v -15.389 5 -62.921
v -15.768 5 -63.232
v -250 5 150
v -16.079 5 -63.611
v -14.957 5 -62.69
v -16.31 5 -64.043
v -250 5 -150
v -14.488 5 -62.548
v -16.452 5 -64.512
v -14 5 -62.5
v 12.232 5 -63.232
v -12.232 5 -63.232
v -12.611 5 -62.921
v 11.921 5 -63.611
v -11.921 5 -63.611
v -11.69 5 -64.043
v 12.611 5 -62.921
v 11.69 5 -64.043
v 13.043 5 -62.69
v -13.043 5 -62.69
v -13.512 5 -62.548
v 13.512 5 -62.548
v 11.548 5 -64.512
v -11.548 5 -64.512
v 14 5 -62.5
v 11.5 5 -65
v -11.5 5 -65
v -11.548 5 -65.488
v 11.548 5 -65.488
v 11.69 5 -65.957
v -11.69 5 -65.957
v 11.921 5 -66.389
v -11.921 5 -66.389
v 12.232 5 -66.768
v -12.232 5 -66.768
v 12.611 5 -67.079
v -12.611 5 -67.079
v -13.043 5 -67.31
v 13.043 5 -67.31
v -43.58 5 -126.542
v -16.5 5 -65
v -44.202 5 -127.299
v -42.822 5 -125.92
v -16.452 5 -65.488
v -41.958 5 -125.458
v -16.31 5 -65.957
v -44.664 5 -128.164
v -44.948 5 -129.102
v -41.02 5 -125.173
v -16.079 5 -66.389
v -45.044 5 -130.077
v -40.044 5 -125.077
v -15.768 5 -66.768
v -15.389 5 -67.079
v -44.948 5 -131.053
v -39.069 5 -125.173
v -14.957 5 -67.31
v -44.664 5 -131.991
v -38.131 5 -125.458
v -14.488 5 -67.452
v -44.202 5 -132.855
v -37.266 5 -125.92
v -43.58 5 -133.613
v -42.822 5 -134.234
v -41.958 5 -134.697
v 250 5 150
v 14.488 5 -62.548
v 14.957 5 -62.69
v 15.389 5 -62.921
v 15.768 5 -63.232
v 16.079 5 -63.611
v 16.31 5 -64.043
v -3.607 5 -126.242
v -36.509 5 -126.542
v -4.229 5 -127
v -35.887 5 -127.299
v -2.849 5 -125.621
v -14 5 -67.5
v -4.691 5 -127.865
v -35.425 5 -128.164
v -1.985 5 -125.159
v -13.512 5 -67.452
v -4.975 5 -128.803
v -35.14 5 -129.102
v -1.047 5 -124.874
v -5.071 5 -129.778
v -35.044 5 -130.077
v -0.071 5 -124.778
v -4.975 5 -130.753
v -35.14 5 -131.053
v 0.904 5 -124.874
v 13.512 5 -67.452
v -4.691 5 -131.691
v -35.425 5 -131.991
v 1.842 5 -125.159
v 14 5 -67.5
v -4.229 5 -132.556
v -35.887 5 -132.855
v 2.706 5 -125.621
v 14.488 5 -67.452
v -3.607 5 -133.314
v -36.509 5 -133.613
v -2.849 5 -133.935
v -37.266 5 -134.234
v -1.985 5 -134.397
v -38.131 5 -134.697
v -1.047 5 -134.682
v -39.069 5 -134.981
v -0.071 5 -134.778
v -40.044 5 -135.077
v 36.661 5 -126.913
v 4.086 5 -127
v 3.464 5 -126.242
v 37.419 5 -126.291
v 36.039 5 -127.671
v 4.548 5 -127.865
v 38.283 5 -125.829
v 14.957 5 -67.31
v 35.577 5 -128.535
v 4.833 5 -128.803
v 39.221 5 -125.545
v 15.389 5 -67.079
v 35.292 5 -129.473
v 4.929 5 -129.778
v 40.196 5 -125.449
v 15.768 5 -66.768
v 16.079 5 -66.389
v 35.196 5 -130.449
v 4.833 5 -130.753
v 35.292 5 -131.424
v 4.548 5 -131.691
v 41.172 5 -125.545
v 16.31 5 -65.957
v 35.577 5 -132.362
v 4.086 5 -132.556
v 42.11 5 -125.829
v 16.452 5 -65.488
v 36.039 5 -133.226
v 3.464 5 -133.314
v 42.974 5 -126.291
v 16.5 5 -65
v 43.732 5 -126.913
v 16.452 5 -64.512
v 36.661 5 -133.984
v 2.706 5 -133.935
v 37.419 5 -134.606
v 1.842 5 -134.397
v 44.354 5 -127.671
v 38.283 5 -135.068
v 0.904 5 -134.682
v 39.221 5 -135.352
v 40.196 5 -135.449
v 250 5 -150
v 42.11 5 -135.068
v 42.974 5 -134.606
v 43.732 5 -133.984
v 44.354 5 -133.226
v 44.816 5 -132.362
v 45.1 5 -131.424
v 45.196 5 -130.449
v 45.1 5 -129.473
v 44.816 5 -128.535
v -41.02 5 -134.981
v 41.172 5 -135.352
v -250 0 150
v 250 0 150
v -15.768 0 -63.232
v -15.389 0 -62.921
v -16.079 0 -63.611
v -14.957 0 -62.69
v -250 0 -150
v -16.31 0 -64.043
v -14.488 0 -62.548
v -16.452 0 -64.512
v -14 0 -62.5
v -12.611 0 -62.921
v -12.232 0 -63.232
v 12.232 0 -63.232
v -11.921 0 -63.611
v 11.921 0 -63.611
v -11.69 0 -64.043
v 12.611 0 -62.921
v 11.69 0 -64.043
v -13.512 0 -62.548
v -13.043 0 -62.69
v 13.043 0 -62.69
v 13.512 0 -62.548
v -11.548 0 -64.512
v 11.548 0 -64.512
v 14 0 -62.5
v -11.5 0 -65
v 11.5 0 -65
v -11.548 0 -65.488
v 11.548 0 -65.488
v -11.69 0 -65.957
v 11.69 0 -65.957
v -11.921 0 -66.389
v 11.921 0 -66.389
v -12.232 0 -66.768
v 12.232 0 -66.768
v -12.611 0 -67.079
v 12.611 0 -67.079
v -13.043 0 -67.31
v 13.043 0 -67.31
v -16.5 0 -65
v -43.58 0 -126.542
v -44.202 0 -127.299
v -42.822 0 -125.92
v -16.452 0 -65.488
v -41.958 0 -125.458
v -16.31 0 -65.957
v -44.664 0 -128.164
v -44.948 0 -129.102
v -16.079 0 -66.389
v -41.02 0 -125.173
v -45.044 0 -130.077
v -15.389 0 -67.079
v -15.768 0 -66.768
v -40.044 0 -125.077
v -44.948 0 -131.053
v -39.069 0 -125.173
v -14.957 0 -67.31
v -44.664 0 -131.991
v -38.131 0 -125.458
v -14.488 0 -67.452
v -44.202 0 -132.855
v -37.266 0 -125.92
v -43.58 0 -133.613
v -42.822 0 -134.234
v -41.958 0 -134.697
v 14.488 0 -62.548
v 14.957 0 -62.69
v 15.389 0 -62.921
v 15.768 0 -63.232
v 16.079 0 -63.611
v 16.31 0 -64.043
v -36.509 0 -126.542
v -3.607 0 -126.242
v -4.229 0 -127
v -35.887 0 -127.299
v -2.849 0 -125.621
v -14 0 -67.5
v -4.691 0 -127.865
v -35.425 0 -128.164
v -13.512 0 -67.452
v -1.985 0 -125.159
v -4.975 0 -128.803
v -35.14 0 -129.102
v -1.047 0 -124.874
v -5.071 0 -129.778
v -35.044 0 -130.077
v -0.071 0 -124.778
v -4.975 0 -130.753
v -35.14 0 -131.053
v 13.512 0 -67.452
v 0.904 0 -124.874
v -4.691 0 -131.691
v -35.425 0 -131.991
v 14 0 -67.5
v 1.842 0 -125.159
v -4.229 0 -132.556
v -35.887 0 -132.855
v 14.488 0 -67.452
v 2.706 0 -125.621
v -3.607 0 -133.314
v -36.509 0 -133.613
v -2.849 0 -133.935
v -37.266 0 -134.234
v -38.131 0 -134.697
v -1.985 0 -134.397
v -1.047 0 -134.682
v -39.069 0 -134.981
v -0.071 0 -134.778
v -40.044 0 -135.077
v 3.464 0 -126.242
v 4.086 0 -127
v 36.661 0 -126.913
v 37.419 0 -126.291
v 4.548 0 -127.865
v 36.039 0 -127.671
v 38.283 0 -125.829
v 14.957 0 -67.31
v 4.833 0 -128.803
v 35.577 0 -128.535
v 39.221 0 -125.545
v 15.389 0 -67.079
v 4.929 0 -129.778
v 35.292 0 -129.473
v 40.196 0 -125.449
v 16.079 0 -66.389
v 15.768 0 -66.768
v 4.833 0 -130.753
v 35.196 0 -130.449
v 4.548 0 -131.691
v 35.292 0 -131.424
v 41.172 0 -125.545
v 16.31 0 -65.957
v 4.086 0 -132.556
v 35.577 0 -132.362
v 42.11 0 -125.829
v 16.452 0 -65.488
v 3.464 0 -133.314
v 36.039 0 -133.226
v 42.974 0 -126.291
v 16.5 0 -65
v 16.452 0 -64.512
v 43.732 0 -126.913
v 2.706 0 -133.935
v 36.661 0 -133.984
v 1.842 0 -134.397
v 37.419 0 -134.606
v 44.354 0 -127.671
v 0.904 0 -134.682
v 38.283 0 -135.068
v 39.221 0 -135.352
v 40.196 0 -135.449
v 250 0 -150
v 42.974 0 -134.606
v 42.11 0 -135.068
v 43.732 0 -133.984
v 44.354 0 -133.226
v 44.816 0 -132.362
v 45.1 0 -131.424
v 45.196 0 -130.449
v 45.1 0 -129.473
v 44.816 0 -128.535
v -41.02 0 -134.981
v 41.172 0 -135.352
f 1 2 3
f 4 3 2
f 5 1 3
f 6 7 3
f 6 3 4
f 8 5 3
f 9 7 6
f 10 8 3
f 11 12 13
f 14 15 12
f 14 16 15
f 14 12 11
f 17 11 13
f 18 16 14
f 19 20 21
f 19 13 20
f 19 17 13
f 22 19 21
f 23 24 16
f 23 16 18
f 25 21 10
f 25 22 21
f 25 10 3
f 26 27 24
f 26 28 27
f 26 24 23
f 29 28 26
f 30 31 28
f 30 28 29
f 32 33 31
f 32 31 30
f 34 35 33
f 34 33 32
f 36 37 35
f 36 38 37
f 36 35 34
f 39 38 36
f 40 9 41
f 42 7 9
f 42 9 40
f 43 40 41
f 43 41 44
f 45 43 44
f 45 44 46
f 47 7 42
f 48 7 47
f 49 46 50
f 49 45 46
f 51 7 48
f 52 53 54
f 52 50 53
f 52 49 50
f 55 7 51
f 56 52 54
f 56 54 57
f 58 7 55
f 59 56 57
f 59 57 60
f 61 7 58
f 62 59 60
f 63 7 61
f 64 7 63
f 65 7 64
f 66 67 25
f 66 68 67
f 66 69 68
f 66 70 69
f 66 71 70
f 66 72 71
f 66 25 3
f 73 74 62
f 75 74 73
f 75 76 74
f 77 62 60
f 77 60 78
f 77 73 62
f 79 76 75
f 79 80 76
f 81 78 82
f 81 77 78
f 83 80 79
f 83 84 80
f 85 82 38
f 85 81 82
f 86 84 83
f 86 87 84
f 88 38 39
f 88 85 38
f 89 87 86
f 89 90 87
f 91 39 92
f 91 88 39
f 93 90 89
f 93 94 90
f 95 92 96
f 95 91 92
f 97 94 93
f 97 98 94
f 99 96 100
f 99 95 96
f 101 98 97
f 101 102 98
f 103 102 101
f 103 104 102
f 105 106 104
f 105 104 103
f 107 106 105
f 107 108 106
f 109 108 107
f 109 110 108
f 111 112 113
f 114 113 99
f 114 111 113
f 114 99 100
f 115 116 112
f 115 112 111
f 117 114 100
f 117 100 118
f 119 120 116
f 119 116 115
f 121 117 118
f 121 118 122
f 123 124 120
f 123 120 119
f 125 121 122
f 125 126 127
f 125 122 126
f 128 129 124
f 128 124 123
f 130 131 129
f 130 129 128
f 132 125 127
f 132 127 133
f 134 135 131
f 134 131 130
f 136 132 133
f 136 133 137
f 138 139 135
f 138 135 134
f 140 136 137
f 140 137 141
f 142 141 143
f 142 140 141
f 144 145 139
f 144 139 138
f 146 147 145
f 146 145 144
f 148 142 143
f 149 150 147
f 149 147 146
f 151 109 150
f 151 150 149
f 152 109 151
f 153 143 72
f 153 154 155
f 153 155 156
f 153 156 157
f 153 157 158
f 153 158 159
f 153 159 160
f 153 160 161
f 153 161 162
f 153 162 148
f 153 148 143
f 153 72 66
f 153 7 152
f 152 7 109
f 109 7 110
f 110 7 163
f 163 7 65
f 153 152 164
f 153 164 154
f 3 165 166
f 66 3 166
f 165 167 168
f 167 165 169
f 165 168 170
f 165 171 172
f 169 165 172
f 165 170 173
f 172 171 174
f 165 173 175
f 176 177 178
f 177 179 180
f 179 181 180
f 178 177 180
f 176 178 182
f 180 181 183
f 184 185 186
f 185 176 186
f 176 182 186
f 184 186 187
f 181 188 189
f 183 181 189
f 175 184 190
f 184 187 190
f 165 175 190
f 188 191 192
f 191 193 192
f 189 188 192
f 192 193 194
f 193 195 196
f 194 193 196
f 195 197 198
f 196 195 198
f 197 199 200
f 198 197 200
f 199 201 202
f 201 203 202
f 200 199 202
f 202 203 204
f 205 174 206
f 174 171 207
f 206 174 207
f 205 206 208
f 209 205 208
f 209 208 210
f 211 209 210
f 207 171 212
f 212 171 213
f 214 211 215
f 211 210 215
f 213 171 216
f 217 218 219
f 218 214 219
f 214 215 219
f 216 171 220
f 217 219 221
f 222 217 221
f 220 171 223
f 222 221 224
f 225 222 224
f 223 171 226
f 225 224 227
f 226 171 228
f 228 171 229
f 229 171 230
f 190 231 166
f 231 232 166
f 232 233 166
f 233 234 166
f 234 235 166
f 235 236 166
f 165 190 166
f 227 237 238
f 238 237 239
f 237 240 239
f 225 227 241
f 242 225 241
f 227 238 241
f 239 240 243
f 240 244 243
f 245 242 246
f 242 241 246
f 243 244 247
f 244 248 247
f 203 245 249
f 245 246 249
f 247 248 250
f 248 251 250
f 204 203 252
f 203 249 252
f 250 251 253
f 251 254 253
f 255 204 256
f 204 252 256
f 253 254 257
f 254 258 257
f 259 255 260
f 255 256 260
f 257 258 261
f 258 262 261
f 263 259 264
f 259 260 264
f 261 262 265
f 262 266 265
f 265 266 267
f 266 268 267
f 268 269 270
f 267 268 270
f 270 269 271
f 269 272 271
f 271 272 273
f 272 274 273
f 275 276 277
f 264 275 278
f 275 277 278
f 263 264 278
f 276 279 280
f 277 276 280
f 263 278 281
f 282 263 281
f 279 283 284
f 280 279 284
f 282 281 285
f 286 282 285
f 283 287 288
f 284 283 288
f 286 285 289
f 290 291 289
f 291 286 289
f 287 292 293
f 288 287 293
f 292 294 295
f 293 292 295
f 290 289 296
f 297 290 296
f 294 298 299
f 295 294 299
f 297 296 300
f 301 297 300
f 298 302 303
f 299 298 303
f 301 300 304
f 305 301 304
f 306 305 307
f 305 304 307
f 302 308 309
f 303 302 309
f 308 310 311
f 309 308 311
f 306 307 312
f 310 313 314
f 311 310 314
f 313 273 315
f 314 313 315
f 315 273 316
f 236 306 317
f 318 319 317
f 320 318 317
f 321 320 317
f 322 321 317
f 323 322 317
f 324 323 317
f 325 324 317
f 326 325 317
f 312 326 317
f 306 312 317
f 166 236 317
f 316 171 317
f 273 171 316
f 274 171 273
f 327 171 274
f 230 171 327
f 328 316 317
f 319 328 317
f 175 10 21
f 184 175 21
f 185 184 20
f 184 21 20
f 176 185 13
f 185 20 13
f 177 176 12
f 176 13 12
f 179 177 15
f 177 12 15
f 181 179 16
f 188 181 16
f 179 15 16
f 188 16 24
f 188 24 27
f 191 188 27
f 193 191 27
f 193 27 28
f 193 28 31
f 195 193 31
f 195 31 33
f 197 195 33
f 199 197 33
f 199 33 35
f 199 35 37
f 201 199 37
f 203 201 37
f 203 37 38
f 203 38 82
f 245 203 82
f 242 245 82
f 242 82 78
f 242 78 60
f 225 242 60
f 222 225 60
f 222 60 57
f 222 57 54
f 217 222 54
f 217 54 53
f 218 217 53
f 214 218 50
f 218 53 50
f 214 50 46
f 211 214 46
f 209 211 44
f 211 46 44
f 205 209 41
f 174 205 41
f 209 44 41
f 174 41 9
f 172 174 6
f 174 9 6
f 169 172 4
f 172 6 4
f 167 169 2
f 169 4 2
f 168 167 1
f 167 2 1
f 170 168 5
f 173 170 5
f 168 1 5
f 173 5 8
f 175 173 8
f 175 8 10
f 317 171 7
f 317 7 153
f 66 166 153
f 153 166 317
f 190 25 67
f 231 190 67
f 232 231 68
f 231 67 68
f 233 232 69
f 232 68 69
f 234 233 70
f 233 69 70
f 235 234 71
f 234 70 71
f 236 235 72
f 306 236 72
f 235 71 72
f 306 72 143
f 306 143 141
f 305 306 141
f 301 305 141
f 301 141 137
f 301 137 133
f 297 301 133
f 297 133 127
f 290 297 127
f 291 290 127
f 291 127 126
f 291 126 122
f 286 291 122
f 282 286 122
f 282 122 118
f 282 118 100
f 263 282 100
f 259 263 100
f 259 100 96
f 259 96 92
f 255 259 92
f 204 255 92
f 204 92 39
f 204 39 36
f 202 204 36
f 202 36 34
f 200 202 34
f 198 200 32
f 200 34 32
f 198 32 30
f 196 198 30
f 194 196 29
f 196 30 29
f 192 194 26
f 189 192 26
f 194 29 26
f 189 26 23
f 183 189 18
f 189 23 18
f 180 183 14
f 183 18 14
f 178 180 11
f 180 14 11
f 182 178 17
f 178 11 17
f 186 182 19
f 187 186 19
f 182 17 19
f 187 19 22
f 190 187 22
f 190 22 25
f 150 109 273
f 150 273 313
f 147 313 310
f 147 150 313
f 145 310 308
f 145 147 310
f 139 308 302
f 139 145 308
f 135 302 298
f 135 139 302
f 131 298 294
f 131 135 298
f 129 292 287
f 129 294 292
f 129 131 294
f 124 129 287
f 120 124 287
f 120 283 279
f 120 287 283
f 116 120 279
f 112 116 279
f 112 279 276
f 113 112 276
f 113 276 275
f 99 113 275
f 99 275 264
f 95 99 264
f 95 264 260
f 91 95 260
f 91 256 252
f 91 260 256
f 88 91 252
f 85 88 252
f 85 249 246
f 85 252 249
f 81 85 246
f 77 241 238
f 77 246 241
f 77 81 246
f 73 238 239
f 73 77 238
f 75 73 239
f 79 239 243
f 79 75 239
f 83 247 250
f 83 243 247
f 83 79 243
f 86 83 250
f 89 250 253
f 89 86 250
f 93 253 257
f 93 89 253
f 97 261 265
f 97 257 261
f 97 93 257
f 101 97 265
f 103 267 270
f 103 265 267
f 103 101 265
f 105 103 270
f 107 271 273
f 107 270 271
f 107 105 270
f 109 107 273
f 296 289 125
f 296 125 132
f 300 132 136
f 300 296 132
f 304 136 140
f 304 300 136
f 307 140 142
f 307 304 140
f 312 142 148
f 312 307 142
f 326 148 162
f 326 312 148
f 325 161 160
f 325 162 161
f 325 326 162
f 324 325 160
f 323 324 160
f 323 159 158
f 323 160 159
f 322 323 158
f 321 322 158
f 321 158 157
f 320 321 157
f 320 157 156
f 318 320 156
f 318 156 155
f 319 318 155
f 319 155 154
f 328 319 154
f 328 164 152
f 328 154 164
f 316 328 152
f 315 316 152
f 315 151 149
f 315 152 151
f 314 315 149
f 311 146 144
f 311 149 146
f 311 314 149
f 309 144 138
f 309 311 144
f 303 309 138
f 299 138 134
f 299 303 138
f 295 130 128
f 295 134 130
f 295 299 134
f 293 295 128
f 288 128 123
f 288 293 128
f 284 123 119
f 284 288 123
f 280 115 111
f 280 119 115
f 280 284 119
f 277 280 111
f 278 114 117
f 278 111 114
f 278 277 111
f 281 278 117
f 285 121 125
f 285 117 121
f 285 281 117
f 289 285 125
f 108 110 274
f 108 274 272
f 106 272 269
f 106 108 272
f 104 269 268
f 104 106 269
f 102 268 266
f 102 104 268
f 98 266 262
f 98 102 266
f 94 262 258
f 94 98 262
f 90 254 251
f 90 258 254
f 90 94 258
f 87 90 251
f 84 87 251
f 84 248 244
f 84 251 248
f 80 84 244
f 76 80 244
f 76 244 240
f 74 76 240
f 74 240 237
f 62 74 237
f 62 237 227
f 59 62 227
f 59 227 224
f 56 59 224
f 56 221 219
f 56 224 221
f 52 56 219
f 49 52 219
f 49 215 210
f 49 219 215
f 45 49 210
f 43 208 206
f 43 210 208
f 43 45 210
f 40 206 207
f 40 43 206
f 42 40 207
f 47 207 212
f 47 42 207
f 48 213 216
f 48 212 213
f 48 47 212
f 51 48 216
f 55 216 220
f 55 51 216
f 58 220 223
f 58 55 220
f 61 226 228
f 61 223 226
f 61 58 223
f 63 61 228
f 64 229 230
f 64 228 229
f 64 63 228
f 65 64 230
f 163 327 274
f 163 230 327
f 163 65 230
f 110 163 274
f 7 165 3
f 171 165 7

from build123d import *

# Parameters (mm, degrees)
SKETCH2_W               = 500
SKETCH2_H               = 300
BOSS_EXTRUDE1_DEPTH     = 5
CUT_EXTRUDE1_DEPTH      = 292.590466236
CUT_EXTRUDE1_DEPTH_BACK = 292.590466236
SKETCH3_R               = 5
CUT_EXTRUDE2_DEPTH      = 292.590466236
CUT_EXTRUDE2_DEPTH_BACK = 292.590466236
SKETCH4_R               = 5
SKETCH5_R               = 2.5
CUT_EXTRUDE3_DEPTH      = 292.590466236


with BuildPart() as part:
    # Sketch2 → Boss-Extrude1 (new body)
    with BuildSketch(Plane(origin=(0, 0, 0), x_dir=(1, 0, 0), z_dir=(0, 1, 0))):
        Rectangle(SKETCH2_W, SKETCH2_H)
    extrude(amount=BOSS_EXTRUDE1_DEPTH)

    # Sketch3 → Cut-Extrude1 (cut, two sides: drawn at the far end of the back side and taken through both)
    with BuildSketch(Plane.XZ.offset(-CUT_EXTRUDE1_DEPTH_BACK)):
        with Locations(Location((-40.044249933, -130.077128907, 0), (0, 0, 270))):
            Circle(SKETCH3_R)
        with Locations(Location((-0.071386653, -129.777985414, 0), (0, 0, 270))):
            Circle(SKETCH3_R)
    extrude(amount=CUT_EXTRUDE1_DEPTH + CUT_EXTRUDE1_DEPTH_BACK, mode=Mode.SUBTRACT)

    # Sketch4 → Cut-Extrude2 (cut, two sides: drawn at the far end of the back side and taken through both)
    with BuildSketch(Plane(origin=(0, 5, 0), x_dir=(1, 0, 0), z_dir=(0, 1, 0)).offset(-CUT_EXTRUDE2_DEPTH_BACK)):
        with Locations(Location((40.196351758, 130.448547008, 0), (0, 0, 270))):
            Circle(SKETCH4_R)
    extrude(amount=CUT_EXTRUDE2_DEPTH + CUT_EXTRUDE2_DEPTH_BACK, mode=Mode.SUBTRACT)

    # Sketch5 → Cut-Extrude3 (cut, through all)
    with BuildSketch(Plane(origin=(0, 5, 0), x_dir=(1, 0, 0), z_dir=(0, 1, 0))):
        with Locations(Location((14, 65, 0), (0, 0, 270))):
            Circle(SKETCH5_R)
        with Locations(Location((-14, 65, 0), (0, 0, 270))):
            Circle(SKETCH5_R)
    extrude(amount=-CUT_EXTRUDE3_DEPTH, mode=Mode.SUBTRACT)


solid = part.part
